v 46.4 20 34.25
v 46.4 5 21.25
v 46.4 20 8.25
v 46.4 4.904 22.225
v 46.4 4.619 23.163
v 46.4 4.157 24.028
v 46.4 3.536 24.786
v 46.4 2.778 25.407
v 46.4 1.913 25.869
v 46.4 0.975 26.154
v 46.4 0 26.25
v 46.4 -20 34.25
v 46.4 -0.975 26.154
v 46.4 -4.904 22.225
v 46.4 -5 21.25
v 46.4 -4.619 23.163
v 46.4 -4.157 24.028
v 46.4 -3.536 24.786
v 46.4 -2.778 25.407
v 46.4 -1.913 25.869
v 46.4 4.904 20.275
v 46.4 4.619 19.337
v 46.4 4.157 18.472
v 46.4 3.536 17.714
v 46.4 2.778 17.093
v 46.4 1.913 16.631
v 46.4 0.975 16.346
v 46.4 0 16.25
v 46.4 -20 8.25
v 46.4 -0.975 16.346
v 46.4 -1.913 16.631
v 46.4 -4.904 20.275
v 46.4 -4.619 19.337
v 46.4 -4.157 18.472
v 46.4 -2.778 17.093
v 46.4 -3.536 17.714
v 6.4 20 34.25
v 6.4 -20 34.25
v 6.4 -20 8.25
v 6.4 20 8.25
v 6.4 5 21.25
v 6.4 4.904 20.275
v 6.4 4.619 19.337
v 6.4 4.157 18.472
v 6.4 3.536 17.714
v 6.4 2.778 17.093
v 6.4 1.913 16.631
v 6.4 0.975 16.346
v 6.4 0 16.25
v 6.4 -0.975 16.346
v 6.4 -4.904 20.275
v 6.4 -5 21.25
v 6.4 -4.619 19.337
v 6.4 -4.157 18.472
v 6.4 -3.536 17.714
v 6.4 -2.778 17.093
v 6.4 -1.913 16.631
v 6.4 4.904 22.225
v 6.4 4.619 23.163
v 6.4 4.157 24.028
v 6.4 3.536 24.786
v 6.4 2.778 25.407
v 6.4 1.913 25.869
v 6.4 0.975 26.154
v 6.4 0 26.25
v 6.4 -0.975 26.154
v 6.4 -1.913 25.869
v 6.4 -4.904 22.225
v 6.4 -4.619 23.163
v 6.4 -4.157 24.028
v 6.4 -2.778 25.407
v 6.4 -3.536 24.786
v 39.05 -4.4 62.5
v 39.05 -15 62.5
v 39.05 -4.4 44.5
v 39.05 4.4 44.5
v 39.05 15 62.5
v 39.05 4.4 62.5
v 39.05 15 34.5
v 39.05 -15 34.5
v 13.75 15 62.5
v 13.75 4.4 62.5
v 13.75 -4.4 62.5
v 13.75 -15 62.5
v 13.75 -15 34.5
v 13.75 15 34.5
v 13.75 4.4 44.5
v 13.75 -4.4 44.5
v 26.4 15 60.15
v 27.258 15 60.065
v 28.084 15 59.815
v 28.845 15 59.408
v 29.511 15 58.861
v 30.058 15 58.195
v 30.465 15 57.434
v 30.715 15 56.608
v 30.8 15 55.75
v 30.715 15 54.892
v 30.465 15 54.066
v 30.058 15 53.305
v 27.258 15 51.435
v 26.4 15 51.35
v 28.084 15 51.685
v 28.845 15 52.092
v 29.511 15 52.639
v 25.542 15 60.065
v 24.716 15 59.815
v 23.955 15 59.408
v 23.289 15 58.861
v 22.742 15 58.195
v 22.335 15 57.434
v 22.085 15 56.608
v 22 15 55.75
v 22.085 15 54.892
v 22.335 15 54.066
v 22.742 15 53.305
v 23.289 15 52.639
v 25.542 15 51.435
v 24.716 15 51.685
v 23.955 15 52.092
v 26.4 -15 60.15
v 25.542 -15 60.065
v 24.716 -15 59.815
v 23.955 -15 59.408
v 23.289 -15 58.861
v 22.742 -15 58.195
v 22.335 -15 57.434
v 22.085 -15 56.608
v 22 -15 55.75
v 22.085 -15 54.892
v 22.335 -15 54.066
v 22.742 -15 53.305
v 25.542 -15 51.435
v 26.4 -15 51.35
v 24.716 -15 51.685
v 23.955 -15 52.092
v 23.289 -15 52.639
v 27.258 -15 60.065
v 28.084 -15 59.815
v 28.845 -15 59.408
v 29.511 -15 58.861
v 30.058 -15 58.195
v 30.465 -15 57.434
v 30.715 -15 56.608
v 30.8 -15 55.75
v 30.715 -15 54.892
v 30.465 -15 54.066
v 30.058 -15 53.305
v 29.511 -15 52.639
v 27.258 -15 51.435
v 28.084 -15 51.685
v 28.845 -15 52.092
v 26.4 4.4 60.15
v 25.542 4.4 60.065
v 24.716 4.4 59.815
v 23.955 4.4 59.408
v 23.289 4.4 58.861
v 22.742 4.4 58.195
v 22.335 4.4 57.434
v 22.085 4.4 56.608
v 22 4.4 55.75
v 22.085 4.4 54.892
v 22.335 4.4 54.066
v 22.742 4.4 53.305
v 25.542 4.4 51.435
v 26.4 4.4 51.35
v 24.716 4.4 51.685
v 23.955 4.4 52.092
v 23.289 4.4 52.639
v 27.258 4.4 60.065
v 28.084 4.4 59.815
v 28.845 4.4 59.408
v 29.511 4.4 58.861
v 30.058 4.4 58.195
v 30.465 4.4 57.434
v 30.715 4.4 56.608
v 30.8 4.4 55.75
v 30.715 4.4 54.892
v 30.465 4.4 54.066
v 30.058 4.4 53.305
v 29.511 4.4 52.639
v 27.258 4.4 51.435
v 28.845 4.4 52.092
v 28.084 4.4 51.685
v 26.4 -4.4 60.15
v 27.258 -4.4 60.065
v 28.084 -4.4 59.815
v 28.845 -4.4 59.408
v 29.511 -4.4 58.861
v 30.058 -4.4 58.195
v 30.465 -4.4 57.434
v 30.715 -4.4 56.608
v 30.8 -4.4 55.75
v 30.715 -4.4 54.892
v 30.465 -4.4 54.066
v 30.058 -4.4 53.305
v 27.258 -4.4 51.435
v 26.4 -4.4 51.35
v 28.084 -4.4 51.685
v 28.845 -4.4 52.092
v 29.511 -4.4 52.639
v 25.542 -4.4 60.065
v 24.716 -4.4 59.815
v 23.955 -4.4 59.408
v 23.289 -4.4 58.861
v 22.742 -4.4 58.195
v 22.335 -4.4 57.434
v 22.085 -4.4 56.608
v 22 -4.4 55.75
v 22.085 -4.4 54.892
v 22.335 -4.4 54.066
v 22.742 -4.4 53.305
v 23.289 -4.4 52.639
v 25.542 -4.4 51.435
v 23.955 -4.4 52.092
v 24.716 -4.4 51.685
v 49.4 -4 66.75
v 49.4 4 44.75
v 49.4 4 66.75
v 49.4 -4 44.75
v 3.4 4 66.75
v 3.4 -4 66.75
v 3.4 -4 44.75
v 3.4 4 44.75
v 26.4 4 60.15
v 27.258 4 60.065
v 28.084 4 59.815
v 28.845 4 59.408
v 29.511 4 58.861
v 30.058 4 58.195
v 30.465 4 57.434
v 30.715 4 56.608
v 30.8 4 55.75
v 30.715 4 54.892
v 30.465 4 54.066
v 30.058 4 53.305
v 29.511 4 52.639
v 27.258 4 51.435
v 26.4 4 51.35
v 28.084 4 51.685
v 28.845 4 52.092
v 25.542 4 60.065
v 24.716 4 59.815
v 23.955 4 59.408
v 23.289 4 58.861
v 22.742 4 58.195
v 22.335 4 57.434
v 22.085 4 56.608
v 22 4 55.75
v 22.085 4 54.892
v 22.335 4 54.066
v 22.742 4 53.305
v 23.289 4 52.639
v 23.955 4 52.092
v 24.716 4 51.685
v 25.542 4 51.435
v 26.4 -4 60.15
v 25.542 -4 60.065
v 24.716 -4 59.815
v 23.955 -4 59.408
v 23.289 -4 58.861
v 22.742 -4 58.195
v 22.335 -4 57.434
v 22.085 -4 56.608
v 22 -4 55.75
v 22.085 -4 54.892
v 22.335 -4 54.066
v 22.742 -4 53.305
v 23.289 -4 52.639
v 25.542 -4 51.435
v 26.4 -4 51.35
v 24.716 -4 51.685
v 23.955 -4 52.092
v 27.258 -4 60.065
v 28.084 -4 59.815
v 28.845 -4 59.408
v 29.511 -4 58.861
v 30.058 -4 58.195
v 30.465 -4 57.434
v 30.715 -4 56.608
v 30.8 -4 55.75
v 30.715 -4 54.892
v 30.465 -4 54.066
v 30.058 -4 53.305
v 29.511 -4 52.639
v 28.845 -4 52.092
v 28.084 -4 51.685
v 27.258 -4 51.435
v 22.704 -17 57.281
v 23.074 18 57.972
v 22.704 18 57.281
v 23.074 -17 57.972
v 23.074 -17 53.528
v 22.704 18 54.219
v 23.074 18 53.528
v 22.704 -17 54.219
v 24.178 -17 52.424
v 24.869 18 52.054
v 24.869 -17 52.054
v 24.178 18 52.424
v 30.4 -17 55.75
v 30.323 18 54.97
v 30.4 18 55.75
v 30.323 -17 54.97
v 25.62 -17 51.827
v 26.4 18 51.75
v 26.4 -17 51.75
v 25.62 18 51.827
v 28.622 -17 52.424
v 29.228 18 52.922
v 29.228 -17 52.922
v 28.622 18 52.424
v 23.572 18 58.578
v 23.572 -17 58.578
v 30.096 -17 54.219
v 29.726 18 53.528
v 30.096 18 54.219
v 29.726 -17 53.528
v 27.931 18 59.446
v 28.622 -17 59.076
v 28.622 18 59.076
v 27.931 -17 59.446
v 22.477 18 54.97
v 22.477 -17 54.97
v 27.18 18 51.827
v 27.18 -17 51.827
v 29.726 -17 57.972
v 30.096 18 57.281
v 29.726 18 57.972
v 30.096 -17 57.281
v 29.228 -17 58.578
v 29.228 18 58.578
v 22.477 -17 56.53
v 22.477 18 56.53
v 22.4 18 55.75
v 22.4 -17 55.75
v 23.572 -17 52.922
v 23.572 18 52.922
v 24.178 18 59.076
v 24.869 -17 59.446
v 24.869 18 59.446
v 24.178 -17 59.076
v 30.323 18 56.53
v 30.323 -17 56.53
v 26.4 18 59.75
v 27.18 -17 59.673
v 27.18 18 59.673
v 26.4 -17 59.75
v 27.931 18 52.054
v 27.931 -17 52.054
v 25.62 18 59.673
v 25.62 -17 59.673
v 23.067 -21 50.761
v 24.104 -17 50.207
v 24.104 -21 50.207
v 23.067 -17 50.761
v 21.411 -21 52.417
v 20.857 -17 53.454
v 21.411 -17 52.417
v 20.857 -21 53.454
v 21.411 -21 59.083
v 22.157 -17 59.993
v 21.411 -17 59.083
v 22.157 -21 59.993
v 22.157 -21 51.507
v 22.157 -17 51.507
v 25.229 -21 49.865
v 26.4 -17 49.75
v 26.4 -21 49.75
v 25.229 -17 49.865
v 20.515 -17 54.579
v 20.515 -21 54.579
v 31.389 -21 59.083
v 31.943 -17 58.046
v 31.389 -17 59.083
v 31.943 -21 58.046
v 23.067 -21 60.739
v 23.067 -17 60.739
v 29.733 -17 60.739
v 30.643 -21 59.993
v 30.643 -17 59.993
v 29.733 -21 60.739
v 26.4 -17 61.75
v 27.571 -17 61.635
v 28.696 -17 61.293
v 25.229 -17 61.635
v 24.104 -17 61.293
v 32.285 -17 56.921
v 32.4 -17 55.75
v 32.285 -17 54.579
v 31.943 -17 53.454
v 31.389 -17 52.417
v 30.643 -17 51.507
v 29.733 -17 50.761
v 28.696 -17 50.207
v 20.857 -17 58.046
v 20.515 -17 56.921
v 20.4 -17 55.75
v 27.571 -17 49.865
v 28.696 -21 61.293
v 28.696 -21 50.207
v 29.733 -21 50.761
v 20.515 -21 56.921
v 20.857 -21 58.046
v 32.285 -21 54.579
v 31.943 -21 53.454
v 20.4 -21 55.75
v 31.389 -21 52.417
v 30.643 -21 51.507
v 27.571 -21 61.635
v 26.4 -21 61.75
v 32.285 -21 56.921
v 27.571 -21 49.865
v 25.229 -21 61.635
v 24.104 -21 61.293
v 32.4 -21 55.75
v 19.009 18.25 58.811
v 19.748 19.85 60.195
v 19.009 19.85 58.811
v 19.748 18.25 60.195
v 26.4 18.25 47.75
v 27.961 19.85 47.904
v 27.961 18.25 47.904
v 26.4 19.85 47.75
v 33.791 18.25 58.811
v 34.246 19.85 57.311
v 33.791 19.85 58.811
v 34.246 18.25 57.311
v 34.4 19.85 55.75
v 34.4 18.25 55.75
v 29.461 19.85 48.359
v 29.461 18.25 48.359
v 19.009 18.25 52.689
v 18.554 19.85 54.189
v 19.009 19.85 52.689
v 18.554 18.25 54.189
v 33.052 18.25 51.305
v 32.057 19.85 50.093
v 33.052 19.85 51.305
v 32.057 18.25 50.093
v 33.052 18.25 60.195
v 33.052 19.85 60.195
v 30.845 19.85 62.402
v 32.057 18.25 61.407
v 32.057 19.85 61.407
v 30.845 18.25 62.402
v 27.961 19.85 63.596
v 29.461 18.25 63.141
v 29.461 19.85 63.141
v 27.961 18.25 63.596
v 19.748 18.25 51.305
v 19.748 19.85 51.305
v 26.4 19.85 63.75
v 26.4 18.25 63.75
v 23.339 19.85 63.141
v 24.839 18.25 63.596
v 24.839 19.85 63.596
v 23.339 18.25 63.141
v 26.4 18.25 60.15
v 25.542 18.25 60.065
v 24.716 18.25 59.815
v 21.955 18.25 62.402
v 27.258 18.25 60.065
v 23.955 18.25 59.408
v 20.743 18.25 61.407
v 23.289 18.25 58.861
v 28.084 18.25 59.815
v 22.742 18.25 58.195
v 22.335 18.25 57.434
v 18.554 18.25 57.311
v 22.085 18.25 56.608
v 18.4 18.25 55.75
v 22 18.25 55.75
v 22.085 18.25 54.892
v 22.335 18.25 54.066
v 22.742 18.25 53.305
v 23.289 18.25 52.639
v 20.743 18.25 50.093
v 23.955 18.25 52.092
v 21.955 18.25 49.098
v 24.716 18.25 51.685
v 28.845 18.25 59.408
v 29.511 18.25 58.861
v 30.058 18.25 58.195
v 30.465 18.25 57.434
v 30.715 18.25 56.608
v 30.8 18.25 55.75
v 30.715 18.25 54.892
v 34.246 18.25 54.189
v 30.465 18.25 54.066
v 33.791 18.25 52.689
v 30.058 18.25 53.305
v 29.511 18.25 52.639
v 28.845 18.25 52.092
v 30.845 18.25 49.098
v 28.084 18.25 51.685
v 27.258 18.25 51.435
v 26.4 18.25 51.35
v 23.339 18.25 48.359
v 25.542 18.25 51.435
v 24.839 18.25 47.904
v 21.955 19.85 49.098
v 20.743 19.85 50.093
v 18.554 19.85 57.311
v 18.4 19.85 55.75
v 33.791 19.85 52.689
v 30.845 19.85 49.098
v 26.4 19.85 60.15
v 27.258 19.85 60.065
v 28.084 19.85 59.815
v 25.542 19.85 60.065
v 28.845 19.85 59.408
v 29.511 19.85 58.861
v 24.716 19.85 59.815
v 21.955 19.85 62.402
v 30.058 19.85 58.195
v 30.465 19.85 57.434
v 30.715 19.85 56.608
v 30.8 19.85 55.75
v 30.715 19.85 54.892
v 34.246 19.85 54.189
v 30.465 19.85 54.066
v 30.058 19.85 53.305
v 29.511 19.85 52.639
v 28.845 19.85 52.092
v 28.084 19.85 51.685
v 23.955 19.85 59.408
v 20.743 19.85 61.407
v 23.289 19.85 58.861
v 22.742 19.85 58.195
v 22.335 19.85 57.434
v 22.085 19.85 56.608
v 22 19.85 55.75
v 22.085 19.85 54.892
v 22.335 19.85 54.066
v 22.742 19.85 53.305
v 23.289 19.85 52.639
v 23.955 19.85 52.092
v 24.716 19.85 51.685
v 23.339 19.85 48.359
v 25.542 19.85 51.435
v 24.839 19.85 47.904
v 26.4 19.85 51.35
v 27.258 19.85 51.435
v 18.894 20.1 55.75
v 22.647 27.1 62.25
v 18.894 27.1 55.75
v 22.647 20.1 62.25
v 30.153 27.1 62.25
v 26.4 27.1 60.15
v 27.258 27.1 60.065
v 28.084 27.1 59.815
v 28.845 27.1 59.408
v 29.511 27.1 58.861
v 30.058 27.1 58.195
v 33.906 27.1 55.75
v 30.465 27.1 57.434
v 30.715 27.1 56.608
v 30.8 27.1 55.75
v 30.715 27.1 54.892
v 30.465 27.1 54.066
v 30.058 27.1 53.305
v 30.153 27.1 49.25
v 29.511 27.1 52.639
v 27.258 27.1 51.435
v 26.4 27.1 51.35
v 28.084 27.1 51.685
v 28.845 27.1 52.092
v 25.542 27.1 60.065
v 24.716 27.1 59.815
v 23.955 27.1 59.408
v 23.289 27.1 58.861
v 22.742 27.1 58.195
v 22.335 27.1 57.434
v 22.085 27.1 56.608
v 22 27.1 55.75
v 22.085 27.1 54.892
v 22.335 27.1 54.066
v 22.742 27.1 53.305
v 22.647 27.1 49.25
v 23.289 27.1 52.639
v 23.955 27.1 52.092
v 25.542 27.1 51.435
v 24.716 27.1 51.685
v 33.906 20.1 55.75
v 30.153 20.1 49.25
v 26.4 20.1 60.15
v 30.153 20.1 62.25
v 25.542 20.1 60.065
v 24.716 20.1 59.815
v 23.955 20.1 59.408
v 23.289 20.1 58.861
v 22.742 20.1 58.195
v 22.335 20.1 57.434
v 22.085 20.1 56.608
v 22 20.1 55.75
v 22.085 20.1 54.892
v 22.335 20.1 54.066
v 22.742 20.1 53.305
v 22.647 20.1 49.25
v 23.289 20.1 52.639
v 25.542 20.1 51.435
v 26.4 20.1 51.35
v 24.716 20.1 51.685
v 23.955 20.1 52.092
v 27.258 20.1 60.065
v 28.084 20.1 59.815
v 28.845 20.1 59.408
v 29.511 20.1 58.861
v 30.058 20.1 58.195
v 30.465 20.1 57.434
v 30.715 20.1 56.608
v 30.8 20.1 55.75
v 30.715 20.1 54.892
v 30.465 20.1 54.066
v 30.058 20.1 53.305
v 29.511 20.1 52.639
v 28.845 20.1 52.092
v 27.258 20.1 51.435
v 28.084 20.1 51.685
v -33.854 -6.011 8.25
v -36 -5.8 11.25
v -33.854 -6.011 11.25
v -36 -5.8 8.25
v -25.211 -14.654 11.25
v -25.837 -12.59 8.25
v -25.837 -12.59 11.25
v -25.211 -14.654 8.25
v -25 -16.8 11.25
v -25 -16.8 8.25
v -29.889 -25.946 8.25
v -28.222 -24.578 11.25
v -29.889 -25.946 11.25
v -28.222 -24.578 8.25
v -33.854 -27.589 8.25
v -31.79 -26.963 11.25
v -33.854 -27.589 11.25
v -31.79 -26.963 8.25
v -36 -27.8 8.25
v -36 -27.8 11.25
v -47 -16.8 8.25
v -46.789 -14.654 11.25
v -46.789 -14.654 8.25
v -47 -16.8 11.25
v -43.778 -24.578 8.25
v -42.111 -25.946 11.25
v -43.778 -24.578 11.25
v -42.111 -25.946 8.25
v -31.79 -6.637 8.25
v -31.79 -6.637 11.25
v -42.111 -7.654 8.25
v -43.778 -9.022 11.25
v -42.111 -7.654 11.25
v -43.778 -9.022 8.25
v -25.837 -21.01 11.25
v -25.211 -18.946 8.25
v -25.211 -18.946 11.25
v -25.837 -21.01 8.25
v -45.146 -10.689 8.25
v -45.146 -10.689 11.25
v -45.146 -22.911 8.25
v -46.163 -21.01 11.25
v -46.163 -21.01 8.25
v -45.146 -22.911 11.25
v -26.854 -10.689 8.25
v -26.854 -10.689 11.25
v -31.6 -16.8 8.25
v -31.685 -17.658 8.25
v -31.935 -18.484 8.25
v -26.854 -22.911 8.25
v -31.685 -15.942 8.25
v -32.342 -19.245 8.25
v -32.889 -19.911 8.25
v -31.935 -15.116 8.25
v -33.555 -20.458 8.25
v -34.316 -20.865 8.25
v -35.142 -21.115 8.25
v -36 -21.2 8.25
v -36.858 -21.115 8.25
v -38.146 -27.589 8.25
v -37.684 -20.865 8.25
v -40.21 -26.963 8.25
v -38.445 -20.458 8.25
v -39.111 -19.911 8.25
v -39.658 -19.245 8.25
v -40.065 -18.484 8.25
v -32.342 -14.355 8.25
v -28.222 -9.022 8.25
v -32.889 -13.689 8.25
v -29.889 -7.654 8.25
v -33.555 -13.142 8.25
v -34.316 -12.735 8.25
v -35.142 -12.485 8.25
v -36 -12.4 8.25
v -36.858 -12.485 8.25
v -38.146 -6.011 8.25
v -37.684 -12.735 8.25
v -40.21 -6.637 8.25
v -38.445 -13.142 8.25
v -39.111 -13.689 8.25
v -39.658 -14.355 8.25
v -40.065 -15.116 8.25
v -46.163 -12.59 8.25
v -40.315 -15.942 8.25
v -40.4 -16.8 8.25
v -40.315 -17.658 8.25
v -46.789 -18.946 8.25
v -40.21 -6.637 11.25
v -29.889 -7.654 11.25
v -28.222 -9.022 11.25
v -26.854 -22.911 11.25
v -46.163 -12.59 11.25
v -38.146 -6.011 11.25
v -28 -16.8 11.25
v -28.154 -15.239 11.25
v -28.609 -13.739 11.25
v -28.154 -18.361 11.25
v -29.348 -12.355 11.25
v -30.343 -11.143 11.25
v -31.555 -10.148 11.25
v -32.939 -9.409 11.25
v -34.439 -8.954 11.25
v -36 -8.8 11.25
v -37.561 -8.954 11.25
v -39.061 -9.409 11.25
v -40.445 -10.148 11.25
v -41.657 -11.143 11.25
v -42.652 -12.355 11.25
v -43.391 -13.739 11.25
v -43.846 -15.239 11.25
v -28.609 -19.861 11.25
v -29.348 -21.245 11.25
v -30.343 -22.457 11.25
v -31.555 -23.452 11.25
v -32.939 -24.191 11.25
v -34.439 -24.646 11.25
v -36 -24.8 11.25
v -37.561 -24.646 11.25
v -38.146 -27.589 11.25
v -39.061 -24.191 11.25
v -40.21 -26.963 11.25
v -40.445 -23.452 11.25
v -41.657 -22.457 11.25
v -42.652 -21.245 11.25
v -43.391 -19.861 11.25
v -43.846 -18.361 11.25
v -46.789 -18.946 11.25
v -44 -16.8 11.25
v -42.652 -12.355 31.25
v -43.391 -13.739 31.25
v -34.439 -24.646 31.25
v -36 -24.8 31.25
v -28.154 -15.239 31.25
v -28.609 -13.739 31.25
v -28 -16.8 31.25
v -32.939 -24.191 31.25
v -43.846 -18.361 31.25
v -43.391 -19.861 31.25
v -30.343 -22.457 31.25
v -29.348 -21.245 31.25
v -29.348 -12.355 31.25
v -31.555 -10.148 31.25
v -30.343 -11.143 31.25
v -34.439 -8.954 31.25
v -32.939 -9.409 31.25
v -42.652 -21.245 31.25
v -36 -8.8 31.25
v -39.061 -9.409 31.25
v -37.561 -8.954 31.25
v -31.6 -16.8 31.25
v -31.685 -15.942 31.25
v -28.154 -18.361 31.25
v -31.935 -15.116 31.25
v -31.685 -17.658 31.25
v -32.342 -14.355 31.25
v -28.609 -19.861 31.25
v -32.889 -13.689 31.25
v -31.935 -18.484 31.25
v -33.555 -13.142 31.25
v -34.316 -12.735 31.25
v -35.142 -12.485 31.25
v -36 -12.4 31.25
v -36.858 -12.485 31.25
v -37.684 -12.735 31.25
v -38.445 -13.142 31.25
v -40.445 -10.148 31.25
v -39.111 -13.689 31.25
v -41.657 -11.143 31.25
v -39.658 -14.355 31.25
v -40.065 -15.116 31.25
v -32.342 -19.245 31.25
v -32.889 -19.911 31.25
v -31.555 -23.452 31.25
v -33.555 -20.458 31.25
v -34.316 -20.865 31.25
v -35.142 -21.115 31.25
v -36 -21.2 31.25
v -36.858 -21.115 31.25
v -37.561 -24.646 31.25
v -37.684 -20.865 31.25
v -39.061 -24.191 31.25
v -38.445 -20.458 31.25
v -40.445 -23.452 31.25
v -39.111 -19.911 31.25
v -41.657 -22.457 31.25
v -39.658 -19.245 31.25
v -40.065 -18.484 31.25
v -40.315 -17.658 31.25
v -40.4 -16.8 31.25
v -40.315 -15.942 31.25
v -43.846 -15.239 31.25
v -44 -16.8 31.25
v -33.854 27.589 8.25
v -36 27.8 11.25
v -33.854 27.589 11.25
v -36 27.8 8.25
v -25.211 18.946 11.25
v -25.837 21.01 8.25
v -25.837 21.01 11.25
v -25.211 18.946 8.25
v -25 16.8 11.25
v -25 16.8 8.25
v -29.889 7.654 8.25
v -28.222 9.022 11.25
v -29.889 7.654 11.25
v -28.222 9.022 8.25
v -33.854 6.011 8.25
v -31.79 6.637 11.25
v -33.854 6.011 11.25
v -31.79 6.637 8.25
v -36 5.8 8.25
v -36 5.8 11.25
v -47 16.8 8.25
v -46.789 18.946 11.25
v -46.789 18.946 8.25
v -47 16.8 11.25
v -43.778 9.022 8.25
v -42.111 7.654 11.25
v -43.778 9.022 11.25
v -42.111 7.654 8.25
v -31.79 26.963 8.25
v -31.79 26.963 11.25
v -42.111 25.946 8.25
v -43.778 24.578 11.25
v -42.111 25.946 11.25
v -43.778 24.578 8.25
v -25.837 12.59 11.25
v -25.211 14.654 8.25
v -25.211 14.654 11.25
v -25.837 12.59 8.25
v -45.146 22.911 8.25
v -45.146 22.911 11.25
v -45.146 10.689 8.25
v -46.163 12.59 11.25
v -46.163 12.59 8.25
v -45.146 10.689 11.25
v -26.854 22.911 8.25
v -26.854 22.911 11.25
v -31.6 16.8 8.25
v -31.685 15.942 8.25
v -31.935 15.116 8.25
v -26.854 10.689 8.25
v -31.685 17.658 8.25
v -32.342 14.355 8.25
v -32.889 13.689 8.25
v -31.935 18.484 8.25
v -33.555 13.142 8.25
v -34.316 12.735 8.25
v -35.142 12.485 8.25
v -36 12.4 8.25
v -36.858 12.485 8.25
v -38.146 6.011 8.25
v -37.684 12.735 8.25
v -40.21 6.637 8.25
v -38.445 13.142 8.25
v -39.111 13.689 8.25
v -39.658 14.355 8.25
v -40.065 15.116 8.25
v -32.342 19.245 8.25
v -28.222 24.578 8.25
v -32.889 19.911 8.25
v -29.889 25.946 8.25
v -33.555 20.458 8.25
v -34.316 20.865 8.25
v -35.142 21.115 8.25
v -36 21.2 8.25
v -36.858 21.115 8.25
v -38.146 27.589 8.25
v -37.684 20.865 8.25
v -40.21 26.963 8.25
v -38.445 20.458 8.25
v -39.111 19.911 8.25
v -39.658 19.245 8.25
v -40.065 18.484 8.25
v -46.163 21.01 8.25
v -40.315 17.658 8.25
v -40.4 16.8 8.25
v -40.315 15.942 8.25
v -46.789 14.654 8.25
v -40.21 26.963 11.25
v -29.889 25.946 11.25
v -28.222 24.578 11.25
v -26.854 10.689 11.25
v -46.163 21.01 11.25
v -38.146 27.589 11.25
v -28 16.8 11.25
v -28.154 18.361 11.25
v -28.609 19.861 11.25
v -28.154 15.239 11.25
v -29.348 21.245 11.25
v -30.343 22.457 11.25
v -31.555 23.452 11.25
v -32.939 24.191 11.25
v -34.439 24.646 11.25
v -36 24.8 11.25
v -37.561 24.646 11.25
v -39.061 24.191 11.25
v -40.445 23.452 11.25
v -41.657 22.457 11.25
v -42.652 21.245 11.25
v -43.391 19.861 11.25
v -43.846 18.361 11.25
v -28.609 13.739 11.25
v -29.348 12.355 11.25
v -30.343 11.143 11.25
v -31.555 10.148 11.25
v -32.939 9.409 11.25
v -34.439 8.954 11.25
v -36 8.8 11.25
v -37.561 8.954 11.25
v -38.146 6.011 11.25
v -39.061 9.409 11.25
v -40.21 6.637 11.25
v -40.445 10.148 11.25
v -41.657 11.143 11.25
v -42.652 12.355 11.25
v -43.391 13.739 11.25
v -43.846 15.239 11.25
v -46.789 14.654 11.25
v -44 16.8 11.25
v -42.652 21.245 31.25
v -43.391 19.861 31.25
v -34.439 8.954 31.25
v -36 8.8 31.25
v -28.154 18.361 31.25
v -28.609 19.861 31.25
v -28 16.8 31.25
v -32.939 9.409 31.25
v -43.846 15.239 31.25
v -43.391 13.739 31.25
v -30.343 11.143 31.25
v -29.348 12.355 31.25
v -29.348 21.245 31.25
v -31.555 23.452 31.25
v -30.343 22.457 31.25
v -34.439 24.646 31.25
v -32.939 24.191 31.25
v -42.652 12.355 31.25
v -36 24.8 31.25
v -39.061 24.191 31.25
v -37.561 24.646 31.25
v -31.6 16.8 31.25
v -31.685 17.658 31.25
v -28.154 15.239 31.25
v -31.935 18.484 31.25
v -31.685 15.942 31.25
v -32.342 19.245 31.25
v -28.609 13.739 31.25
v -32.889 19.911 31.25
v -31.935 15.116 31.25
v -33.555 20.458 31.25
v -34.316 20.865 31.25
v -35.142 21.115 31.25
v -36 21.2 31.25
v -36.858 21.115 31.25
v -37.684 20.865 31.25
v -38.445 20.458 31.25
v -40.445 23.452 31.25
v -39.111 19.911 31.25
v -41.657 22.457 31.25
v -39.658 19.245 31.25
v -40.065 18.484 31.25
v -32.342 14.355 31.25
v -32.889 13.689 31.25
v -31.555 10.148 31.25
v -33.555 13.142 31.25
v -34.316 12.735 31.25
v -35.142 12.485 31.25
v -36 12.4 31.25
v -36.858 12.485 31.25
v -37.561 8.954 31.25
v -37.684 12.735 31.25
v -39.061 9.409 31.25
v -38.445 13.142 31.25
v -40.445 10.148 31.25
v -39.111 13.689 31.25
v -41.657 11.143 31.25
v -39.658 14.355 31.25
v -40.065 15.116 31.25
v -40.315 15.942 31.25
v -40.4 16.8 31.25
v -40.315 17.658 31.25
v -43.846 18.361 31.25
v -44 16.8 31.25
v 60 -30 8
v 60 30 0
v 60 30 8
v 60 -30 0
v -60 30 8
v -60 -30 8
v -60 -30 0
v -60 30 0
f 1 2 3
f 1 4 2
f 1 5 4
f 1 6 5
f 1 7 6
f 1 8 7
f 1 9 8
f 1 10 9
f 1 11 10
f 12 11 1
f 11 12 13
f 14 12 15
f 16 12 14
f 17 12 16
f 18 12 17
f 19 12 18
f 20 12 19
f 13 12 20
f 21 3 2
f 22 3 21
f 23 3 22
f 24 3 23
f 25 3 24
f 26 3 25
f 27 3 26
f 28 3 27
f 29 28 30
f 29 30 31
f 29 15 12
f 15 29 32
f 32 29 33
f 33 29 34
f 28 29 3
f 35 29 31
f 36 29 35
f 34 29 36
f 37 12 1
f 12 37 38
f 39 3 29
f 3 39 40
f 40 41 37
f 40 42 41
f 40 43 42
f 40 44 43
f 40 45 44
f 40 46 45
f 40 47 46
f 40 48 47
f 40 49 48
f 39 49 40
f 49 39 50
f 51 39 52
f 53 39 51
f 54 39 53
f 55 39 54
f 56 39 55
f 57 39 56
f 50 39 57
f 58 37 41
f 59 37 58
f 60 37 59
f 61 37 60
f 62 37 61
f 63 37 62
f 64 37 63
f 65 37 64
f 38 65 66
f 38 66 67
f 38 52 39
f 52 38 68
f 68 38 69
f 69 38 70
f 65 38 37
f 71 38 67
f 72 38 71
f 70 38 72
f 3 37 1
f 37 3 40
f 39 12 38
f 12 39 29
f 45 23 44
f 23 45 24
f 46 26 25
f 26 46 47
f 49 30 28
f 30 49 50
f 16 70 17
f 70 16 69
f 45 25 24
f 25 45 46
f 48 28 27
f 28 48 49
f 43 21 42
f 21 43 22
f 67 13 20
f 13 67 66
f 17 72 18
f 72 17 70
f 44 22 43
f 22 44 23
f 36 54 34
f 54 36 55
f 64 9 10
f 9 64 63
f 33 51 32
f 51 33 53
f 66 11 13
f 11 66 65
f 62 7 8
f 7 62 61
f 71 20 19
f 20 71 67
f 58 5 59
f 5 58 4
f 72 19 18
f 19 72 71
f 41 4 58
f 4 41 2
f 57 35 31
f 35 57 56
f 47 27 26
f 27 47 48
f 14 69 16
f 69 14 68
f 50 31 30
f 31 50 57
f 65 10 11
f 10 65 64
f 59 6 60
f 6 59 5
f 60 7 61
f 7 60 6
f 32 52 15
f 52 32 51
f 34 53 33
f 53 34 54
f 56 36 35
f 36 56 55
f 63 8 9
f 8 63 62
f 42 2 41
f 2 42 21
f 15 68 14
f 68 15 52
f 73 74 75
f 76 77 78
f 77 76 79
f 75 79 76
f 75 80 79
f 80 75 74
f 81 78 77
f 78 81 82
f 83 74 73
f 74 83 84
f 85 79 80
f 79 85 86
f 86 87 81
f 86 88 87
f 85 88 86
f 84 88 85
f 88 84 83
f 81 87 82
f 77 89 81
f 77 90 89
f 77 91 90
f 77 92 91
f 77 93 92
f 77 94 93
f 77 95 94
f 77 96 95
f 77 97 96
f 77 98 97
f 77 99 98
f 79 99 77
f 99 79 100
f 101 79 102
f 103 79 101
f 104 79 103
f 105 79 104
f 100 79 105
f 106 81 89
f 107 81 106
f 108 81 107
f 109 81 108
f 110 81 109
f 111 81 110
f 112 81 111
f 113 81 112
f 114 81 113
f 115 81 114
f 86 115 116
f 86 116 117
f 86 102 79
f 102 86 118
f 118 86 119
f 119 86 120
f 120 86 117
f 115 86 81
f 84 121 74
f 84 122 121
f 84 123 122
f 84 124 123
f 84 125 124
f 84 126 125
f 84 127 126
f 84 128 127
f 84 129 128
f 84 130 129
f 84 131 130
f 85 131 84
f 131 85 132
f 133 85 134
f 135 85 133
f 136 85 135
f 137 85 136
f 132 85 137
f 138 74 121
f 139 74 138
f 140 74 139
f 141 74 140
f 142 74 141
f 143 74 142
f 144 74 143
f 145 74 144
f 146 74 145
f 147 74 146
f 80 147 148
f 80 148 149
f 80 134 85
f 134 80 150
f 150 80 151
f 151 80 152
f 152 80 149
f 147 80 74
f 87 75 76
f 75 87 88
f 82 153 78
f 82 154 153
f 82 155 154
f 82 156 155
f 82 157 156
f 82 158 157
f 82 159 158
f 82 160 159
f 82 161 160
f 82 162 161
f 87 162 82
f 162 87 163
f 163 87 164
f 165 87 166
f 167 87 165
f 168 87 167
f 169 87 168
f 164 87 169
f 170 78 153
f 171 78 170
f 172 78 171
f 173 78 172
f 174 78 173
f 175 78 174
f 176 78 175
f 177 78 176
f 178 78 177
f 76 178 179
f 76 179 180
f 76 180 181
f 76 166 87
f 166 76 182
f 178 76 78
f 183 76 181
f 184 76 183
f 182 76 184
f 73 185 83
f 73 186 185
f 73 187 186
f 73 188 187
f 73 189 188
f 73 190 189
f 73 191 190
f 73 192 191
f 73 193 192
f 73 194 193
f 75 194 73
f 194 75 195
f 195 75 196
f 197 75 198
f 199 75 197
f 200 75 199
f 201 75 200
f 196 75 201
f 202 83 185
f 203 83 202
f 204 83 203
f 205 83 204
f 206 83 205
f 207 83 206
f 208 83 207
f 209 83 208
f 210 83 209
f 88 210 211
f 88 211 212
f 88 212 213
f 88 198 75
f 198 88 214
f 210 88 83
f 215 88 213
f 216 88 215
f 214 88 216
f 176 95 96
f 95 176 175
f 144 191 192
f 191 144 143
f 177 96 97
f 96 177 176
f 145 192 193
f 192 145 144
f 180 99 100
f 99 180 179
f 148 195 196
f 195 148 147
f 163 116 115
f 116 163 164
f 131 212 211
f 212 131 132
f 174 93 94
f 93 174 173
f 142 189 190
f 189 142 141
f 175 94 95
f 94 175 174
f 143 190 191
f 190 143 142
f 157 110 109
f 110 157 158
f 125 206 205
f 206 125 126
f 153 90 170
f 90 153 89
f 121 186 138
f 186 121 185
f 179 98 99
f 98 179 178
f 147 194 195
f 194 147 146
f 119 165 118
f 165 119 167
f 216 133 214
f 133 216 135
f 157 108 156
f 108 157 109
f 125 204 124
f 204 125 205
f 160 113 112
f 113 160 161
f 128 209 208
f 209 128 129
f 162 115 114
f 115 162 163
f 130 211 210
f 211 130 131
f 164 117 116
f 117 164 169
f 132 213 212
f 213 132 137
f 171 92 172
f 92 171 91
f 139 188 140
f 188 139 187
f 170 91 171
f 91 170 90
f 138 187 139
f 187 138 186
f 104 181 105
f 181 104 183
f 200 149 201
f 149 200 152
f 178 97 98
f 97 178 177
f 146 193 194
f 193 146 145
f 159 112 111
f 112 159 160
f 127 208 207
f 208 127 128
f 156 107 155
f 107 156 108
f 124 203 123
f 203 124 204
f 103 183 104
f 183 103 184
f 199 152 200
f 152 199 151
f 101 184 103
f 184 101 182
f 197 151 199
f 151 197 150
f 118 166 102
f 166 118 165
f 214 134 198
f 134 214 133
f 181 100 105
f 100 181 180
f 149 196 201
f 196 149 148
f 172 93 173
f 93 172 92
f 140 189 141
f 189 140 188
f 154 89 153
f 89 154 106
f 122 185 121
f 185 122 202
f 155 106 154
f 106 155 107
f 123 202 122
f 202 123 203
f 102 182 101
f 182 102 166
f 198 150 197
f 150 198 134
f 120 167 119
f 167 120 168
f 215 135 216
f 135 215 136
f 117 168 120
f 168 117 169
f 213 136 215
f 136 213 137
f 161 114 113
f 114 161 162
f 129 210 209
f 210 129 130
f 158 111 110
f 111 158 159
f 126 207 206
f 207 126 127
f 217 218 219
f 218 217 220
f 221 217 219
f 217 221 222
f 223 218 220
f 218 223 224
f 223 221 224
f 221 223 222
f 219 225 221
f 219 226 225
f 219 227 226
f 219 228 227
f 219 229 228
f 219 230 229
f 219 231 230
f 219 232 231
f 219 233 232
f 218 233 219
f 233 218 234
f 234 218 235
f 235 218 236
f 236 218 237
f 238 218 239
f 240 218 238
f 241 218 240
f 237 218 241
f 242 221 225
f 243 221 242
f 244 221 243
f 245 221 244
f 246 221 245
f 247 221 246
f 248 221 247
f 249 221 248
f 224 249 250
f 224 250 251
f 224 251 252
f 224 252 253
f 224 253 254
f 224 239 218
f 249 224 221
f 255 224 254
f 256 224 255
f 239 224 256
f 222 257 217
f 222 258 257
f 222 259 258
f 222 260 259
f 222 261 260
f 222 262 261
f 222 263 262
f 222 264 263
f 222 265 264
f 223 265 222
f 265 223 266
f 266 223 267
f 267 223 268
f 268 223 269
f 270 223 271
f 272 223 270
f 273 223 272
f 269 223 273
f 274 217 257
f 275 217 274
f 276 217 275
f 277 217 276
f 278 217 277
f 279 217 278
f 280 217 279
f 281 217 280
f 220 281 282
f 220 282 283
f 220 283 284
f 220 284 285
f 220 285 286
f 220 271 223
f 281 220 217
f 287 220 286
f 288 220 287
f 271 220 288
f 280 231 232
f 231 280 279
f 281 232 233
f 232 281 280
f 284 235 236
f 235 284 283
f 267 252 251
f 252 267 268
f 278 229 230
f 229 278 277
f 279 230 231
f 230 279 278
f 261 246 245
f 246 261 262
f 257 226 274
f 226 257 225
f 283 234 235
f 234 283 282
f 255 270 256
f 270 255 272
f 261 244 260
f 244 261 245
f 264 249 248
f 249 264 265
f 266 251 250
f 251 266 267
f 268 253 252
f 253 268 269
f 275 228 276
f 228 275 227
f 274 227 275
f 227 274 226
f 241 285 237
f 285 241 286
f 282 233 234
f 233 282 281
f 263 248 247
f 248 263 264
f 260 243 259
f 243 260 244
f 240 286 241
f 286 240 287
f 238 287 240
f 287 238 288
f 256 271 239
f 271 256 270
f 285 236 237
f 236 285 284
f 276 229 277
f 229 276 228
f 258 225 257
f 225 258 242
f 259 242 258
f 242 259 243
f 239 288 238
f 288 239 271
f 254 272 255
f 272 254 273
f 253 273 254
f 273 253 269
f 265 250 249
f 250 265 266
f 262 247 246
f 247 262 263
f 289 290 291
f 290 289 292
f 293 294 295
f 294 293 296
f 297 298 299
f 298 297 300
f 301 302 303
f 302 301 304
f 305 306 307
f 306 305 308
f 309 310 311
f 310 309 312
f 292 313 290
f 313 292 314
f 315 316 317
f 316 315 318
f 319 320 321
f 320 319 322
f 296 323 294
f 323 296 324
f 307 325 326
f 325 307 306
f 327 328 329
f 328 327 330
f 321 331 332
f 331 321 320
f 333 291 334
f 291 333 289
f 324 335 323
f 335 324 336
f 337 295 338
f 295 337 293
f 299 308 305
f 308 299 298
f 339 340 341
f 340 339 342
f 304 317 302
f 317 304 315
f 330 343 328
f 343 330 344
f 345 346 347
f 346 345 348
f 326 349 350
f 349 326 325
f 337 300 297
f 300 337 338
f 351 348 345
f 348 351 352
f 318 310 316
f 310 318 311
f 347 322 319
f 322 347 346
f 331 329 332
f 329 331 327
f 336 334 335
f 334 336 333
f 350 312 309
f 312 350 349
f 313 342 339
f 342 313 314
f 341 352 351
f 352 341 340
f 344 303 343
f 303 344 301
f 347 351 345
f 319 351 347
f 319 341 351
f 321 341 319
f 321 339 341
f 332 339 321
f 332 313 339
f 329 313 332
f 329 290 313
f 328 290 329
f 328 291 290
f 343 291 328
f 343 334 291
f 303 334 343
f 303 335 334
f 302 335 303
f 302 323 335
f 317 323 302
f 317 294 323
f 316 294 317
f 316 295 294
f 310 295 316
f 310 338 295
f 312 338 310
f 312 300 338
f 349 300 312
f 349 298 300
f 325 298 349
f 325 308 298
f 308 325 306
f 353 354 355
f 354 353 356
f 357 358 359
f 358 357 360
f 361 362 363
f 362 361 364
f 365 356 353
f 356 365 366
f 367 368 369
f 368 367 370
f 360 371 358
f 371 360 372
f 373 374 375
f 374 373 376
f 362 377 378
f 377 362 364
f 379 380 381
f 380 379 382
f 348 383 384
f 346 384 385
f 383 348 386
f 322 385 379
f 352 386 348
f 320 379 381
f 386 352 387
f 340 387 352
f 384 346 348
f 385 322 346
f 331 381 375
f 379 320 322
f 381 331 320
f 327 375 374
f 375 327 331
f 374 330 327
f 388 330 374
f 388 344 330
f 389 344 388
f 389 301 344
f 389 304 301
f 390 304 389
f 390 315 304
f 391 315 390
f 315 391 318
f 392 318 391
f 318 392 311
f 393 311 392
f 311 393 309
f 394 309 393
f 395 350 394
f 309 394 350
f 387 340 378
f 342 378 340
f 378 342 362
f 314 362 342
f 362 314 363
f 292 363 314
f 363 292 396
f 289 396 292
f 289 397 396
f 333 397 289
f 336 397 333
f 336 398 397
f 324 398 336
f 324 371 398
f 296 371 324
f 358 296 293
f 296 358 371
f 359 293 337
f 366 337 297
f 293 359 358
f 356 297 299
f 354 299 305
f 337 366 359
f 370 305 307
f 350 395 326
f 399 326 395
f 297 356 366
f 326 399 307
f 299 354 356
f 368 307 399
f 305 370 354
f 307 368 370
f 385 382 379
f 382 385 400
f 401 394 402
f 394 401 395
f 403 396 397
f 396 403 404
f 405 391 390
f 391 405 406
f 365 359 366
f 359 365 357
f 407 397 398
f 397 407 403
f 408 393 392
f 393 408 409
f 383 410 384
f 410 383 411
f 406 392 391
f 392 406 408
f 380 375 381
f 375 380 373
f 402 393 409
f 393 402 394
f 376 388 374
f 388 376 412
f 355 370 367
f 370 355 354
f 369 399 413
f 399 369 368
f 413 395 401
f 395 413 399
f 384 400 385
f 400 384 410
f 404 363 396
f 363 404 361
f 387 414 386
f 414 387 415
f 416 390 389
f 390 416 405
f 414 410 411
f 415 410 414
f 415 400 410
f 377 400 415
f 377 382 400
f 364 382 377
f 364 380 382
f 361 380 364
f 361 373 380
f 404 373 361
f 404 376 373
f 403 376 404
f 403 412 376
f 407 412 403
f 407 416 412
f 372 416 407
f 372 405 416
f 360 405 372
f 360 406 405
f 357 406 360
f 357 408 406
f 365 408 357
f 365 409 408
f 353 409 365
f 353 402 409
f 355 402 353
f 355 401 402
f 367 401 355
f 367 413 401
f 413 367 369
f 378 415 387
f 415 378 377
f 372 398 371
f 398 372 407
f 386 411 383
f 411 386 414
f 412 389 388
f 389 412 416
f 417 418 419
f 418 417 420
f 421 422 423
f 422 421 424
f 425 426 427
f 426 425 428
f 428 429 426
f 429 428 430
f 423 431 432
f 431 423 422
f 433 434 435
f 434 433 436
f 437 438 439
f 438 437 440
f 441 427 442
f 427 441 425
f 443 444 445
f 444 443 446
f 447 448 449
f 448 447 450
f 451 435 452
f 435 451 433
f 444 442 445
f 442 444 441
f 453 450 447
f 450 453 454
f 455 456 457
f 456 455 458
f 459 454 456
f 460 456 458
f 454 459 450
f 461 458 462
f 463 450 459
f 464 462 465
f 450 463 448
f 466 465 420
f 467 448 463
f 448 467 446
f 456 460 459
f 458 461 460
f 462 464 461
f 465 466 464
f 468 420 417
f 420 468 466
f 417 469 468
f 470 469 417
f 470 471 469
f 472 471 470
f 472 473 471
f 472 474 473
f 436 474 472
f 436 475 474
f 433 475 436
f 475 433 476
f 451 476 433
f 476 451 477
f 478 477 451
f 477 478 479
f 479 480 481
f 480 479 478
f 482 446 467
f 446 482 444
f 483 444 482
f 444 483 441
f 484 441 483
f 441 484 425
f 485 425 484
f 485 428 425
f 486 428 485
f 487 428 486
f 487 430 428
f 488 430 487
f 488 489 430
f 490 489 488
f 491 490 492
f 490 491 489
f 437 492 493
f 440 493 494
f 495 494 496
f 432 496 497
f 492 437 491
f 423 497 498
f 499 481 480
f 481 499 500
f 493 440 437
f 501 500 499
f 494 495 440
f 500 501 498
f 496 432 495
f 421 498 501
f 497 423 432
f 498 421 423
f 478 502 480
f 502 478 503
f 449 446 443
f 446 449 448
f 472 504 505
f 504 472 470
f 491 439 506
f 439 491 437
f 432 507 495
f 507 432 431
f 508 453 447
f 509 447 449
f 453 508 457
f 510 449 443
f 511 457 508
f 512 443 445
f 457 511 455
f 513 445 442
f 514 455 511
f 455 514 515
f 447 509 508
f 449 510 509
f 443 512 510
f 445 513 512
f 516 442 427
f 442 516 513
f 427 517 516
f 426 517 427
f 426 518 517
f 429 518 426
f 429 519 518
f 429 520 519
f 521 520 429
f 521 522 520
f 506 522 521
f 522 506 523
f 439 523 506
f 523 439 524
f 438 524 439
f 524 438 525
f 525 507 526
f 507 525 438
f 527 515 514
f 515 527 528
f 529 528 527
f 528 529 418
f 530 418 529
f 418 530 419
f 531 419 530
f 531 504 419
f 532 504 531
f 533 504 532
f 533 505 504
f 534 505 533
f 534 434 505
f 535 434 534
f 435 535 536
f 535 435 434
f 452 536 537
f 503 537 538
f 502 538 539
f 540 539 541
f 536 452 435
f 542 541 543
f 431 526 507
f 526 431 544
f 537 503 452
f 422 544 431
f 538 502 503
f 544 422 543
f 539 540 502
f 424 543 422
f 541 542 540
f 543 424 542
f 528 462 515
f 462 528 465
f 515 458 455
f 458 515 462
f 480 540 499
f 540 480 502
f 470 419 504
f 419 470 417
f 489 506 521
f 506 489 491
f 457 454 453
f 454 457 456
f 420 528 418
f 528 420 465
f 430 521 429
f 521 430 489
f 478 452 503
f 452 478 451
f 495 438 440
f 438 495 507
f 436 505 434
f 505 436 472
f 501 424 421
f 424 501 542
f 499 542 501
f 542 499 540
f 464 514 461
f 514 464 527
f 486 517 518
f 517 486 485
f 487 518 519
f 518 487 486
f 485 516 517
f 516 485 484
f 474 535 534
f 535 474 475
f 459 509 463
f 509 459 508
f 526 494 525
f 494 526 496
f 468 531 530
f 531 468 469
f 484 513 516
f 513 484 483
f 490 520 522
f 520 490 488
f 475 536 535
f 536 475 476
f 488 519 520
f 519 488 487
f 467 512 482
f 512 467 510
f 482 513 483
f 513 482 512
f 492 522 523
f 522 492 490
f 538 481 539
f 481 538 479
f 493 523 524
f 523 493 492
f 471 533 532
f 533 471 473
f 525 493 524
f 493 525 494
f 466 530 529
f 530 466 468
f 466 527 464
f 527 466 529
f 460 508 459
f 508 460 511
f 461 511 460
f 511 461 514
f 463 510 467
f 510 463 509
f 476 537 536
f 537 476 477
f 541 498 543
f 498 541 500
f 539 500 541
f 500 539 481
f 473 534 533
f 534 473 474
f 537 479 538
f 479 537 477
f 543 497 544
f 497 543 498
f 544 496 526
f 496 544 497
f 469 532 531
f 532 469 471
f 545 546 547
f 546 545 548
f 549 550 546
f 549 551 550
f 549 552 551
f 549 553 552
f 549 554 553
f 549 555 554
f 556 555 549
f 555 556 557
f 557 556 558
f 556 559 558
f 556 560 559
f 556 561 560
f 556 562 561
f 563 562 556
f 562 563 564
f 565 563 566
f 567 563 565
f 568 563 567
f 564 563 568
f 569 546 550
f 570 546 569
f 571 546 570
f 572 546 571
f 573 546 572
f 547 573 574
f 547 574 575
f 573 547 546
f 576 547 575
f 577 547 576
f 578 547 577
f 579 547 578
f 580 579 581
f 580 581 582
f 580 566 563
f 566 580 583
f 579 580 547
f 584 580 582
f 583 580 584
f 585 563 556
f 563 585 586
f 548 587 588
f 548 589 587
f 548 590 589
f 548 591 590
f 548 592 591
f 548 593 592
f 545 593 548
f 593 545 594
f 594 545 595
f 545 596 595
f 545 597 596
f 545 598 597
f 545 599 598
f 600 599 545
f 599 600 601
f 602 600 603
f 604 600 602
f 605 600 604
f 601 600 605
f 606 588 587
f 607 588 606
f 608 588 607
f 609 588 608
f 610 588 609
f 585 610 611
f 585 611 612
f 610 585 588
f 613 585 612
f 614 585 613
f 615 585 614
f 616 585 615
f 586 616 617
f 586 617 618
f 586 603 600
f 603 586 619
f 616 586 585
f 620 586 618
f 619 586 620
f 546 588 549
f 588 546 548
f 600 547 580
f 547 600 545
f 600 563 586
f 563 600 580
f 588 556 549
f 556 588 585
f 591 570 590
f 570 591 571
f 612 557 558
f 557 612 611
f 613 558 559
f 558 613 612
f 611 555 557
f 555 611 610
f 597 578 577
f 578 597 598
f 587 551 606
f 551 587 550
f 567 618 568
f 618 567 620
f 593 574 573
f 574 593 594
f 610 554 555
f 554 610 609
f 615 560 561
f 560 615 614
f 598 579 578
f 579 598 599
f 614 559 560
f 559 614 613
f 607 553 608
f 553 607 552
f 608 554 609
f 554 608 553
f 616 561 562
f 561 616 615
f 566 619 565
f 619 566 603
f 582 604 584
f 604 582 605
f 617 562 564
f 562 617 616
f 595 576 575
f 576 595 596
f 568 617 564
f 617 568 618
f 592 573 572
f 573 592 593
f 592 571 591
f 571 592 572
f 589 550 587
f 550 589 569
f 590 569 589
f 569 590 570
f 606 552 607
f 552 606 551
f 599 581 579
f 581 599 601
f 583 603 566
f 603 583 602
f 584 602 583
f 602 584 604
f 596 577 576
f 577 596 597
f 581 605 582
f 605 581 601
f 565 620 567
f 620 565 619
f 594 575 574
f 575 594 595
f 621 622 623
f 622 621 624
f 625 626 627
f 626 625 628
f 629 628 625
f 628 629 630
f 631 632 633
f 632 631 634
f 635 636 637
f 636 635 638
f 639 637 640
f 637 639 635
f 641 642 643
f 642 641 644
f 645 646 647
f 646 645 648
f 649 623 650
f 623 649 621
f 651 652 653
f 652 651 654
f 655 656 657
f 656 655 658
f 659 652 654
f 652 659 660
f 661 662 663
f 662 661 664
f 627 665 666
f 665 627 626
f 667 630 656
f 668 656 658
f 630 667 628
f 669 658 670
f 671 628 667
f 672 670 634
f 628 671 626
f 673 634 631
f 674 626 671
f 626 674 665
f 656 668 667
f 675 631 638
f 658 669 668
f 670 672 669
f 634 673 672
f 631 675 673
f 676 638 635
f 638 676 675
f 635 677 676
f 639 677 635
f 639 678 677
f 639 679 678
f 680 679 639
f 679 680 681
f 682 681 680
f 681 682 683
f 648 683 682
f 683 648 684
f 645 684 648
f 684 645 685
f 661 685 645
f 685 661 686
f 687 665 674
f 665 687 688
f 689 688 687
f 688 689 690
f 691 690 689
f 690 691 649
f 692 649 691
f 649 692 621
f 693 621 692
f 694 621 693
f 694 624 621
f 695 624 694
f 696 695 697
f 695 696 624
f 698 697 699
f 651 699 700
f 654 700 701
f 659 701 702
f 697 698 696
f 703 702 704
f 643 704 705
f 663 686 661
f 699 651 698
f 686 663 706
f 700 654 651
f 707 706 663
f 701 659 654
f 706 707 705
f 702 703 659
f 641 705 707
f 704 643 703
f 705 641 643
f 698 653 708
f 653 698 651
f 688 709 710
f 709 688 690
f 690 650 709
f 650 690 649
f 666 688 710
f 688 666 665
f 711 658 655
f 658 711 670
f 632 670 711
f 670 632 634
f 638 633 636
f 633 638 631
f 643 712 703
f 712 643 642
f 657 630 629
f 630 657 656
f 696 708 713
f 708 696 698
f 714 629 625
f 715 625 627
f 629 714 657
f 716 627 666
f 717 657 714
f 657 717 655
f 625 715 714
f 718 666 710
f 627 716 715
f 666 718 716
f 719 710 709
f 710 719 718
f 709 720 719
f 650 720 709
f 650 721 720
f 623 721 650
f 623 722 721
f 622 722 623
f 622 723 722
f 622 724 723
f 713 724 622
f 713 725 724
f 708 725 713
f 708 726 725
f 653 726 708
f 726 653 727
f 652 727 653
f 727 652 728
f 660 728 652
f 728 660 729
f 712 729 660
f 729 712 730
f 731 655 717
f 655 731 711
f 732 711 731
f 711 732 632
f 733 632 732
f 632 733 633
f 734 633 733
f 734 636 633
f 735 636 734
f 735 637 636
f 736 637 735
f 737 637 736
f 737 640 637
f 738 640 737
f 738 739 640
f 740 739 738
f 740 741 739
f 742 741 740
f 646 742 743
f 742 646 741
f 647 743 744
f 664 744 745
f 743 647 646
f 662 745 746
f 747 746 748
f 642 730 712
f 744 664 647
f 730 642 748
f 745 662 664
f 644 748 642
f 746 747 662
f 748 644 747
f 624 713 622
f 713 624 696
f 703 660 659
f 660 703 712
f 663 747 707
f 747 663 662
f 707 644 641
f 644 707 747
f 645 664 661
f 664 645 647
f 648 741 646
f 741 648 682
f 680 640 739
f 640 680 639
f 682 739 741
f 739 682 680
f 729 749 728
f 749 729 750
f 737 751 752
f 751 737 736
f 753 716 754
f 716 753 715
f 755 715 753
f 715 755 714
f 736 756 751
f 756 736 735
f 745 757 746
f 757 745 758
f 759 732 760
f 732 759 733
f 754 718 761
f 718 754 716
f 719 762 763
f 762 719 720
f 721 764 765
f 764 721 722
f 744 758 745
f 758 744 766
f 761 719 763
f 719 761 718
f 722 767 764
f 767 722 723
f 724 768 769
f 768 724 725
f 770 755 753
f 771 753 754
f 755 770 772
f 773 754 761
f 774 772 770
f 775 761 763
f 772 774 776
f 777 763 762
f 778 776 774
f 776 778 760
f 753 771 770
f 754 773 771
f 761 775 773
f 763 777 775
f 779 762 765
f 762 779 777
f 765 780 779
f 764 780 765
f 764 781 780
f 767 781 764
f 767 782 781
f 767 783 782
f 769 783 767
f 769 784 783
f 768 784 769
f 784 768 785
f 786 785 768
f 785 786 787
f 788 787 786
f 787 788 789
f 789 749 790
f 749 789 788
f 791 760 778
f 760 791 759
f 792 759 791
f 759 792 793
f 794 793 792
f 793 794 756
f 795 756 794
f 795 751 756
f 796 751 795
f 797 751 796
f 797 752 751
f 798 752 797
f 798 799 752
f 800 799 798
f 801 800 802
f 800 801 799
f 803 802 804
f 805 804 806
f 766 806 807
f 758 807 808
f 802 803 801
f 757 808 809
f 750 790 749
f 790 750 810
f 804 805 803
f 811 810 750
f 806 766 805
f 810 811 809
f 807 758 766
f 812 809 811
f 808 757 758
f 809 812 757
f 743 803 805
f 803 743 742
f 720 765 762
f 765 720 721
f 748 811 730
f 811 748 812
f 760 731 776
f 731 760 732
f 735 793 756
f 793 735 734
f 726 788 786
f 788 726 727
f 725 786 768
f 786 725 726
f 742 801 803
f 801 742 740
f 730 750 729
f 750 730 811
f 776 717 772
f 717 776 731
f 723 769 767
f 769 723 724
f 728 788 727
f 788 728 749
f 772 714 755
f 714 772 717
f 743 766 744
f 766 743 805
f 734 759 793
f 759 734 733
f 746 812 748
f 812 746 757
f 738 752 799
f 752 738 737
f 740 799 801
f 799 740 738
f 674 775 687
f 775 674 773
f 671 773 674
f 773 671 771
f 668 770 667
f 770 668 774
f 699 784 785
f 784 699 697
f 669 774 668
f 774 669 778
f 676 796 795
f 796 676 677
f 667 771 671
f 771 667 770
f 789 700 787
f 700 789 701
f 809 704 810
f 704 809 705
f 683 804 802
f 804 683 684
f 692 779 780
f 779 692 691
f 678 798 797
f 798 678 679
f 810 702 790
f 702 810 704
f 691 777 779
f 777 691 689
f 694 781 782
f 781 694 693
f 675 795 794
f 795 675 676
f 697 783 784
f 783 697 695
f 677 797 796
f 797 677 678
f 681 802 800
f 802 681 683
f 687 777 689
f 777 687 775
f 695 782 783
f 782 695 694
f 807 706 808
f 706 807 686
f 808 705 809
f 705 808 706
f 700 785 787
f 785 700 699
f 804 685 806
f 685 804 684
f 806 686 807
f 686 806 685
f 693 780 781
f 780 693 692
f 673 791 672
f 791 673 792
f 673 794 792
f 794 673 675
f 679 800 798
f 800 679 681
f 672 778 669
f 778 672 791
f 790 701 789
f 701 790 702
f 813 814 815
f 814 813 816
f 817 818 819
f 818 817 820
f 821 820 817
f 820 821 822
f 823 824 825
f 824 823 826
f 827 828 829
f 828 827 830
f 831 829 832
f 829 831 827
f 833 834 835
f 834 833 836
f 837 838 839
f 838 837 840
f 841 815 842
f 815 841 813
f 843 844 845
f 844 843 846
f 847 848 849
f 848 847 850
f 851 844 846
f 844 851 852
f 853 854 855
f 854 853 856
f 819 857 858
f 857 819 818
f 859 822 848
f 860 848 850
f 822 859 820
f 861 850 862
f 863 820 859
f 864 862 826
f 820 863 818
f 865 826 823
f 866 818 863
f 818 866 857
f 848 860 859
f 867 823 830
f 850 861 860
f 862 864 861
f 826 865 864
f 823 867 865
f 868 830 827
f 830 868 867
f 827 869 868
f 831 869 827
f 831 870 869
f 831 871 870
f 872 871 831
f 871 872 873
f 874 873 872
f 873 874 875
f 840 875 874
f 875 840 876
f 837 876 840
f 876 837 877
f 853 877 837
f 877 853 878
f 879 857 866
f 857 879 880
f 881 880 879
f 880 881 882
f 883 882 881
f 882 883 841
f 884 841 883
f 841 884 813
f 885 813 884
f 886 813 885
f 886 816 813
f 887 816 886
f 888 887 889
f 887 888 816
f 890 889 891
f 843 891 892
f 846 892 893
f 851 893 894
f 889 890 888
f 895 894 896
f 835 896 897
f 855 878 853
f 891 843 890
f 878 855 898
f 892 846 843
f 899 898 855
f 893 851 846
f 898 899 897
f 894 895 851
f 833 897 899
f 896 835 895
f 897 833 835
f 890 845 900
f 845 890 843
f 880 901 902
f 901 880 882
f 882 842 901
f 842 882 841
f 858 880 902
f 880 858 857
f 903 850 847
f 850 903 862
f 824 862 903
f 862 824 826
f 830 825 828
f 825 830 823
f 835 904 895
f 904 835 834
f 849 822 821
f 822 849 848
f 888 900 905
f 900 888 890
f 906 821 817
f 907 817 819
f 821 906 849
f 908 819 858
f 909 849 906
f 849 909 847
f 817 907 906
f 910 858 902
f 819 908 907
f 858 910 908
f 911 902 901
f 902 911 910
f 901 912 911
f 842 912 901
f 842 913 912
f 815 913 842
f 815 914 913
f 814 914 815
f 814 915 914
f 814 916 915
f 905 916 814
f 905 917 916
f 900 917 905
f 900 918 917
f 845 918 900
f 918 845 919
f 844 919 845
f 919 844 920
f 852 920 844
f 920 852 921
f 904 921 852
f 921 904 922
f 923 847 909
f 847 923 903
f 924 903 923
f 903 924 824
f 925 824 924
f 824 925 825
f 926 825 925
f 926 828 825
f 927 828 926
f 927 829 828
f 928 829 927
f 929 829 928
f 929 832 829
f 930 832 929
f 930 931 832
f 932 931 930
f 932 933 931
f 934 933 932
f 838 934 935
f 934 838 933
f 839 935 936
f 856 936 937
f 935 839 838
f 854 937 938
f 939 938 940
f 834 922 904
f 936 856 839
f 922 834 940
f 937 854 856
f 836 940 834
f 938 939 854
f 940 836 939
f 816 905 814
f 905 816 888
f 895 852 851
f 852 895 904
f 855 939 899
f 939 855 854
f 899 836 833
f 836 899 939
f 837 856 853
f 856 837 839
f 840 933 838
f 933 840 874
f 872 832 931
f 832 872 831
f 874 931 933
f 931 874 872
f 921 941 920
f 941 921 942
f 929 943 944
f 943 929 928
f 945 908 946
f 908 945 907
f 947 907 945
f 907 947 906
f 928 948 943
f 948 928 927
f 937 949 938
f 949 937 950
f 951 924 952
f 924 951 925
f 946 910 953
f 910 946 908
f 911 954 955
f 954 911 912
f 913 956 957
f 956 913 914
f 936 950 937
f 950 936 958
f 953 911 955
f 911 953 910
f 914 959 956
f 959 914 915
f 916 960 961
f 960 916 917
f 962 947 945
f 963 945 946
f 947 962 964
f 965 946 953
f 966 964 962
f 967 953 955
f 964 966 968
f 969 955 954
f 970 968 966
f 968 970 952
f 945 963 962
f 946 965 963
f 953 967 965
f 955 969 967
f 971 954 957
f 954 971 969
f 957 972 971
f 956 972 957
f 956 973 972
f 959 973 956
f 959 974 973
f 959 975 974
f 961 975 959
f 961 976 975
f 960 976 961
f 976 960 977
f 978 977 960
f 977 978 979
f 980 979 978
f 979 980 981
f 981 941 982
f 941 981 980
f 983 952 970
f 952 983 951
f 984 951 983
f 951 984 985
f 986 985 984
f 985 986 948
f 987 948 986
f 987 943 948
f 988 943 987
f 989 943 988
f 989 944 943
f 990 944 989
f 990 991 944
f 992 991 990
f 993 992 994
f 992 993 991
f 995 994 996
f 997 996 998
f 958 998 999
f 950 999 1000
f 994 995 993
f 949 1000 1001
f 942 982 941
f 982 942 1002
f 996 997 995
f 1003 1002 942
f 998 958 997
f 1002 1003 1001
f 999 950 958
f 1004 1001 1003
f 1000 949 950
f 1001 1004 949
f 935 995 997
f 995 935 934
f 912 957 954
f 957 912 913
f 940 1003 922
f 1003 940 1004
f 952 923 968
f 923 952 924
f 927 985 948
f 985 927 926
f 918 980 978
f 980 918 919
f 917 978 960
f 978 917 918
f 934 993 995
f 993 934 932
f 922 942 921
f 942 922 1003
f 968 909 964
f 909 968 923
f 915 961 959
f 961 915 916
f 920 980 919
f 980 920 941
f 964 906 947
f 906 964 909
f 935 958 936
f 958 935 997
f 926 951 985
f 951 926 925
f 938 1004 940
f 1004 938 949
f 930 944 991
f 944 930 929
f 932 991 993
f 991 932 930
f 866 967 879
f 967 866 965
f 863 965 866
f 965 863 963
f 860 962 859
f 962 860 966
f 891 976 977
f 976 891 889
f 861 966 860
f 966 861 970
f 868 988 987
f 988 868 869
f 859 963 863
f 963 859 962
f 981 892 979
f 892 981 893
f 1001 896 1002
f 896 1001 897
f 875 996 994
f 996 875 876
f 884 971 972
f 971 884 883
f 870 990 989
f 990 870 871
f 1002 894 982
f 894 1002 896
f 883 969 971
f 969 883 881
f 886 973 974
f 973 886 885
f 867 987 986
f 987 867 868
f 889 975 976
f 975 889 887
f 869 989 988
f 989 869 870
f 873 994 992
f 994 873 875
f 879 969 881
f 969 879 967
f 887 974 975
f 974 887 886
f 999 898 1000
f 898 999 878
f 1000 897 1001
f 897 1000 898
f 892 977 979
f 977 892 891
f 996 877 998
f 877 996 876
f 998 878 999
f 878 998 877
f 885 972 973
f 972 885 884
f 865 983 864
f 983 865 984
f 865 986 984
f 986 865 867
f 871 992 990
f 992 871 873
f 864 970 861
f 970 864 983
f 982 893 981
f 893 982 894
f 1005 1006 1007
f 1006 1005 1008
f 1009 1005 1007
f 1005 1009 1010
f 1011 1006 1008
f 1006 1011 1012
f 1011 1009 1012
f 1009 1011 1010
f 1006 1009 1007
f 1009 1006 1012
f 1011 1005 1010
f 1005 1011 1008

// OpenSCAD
$fn = 32;

// ------------------------------------------------------------------------
// Indexing jig: plate 120 x 60 mm, pin d8
// Every part is its own module, assembly() places every instance.
// ------------------------------------------------------------------------

// --- part 1 ---
module jig_plate() {
  difference() {
    translate([-60, -30, 0]) cube([120, 60, 8]);
  }
}

// --- part 2 ---
module locator_block() {
  difference() {
    translate([-20, -20, 0]) cube([40, 40, 26]);
    translate([0, 0, 13]) rotate([0, 90, 0]) cylinder(h = 42, d = 10, center = true);
  }
}

// --- part 3 ---
module index_fork() {
  difference() {
    translate([-12.65, -15, 0]) cube([25.3, 30, 28]);
    translate([-13.65, -4.4, 10]) cube([27.3, 8.8, 19]);
    translate([0, 0, 21.25]) rotate([90, 0, 0]) cylinder(h = 32, d = 8.8, center = true);
  }
}

// --- part 4 ---
module index_arm() {
  difference() {
    translate([-23, -4, 0]) cube([46, 8, 22]);
    translate([0, 0, 11]) rotate([90, 0, 0]) cylinder(h = 10, d = 8.8, center = true);
  }
}

// --- part 5 ---
module index_pin() {
  rotate([0, 90, 0]) cylinder(h = 36, d = 8, center = true);
  translate([-21, 0, 0]) rotate([0, 90, 0]) cylinder(h = 4, d = 12);
}

// --- part 6 ---
module pin_washer() {
  difference() {
      translate([0, 0, 0]) cylinder(h = 1.6, d = 16);
      translate([0, 0, -1]) cylinder(h = 3.6, d = 8.8);
    }
}

// --- part 7 ---
module lock_nut() {
  difference() {
    linear_extrude(height = 7) polygon(points = [[7.506, 0], [3.753, 6.5], [-3.753, 6.5], [-7.506, 0], [-3.753, -6.5], [3.753, -6.5]]);
    translate([0, 0, -1]) cylinder(h = 9, d = 8.8);
  }
}

// --- part 8 ---
module guide_bush_a() {
  difference() {
    union() {
      cylinder(h = 3, d = 22);
      translate([0, 0, 3]) cylinder(h = 20, d = 16);
    }
    translate([0, 0, -1]) cylinder(h = 25, d = 8.8);
  }
}

// --- part 9 ---
module guide_bush_b() {
  difference() {
    union() {
      cylinder(h = 3, d = 22);
      translate([0, 0, 3]) cylinder(h = 20, d = 16);
    }
    translate([0, 0, -1]) cylinder(h = 25, d = 8.8);
  }
}

// --- assembly ---
module assembly() {
  color([0.80, 0.24, 0.20]) translate([0, 0, 0]) rotate([0, 0, 0]) jig_plate();
  color([0.20, 0.45, 0.75]) translate([26.4, 0, 8.25]) rotate([0, 0, 0]) locator_block();
  color([0.25, 0.62, 0.32]) translate([26.4, 0, 34.5]) rotate([0, 0, 0]) index_fork();
  color([0.92, 0.70, 0.18]) translate([26.4, 0, 44.75]) rotate([0, 0, 0]) index_arm();
  color([0.58, 0.35, 0.70]) translate([26.4, 0, 55.75]) rotate([0, 0, 90]) index_pin();
  color([0.16, 0.66, 0.66]) translate([26.4, 19.85, 55.75]) rotate([90, 0, 0]) pin_washer();
  color([0.85, 0.48, 0.18]) translate([26.4, 27.1, 55.75]) rotate([90, 0, 0]) lock_nut();
  color([0.55, 0.60, 0.65]) translate([-36, -16.8, 8.25]) rotate([0, 0, 0]) guide_bush_a();
  color([0.75, 0.30, 0.55]) translate([-36, 16.8, 8.25]) rotate([0, 0, 0]) guide_bush_b();
}

assembly();
